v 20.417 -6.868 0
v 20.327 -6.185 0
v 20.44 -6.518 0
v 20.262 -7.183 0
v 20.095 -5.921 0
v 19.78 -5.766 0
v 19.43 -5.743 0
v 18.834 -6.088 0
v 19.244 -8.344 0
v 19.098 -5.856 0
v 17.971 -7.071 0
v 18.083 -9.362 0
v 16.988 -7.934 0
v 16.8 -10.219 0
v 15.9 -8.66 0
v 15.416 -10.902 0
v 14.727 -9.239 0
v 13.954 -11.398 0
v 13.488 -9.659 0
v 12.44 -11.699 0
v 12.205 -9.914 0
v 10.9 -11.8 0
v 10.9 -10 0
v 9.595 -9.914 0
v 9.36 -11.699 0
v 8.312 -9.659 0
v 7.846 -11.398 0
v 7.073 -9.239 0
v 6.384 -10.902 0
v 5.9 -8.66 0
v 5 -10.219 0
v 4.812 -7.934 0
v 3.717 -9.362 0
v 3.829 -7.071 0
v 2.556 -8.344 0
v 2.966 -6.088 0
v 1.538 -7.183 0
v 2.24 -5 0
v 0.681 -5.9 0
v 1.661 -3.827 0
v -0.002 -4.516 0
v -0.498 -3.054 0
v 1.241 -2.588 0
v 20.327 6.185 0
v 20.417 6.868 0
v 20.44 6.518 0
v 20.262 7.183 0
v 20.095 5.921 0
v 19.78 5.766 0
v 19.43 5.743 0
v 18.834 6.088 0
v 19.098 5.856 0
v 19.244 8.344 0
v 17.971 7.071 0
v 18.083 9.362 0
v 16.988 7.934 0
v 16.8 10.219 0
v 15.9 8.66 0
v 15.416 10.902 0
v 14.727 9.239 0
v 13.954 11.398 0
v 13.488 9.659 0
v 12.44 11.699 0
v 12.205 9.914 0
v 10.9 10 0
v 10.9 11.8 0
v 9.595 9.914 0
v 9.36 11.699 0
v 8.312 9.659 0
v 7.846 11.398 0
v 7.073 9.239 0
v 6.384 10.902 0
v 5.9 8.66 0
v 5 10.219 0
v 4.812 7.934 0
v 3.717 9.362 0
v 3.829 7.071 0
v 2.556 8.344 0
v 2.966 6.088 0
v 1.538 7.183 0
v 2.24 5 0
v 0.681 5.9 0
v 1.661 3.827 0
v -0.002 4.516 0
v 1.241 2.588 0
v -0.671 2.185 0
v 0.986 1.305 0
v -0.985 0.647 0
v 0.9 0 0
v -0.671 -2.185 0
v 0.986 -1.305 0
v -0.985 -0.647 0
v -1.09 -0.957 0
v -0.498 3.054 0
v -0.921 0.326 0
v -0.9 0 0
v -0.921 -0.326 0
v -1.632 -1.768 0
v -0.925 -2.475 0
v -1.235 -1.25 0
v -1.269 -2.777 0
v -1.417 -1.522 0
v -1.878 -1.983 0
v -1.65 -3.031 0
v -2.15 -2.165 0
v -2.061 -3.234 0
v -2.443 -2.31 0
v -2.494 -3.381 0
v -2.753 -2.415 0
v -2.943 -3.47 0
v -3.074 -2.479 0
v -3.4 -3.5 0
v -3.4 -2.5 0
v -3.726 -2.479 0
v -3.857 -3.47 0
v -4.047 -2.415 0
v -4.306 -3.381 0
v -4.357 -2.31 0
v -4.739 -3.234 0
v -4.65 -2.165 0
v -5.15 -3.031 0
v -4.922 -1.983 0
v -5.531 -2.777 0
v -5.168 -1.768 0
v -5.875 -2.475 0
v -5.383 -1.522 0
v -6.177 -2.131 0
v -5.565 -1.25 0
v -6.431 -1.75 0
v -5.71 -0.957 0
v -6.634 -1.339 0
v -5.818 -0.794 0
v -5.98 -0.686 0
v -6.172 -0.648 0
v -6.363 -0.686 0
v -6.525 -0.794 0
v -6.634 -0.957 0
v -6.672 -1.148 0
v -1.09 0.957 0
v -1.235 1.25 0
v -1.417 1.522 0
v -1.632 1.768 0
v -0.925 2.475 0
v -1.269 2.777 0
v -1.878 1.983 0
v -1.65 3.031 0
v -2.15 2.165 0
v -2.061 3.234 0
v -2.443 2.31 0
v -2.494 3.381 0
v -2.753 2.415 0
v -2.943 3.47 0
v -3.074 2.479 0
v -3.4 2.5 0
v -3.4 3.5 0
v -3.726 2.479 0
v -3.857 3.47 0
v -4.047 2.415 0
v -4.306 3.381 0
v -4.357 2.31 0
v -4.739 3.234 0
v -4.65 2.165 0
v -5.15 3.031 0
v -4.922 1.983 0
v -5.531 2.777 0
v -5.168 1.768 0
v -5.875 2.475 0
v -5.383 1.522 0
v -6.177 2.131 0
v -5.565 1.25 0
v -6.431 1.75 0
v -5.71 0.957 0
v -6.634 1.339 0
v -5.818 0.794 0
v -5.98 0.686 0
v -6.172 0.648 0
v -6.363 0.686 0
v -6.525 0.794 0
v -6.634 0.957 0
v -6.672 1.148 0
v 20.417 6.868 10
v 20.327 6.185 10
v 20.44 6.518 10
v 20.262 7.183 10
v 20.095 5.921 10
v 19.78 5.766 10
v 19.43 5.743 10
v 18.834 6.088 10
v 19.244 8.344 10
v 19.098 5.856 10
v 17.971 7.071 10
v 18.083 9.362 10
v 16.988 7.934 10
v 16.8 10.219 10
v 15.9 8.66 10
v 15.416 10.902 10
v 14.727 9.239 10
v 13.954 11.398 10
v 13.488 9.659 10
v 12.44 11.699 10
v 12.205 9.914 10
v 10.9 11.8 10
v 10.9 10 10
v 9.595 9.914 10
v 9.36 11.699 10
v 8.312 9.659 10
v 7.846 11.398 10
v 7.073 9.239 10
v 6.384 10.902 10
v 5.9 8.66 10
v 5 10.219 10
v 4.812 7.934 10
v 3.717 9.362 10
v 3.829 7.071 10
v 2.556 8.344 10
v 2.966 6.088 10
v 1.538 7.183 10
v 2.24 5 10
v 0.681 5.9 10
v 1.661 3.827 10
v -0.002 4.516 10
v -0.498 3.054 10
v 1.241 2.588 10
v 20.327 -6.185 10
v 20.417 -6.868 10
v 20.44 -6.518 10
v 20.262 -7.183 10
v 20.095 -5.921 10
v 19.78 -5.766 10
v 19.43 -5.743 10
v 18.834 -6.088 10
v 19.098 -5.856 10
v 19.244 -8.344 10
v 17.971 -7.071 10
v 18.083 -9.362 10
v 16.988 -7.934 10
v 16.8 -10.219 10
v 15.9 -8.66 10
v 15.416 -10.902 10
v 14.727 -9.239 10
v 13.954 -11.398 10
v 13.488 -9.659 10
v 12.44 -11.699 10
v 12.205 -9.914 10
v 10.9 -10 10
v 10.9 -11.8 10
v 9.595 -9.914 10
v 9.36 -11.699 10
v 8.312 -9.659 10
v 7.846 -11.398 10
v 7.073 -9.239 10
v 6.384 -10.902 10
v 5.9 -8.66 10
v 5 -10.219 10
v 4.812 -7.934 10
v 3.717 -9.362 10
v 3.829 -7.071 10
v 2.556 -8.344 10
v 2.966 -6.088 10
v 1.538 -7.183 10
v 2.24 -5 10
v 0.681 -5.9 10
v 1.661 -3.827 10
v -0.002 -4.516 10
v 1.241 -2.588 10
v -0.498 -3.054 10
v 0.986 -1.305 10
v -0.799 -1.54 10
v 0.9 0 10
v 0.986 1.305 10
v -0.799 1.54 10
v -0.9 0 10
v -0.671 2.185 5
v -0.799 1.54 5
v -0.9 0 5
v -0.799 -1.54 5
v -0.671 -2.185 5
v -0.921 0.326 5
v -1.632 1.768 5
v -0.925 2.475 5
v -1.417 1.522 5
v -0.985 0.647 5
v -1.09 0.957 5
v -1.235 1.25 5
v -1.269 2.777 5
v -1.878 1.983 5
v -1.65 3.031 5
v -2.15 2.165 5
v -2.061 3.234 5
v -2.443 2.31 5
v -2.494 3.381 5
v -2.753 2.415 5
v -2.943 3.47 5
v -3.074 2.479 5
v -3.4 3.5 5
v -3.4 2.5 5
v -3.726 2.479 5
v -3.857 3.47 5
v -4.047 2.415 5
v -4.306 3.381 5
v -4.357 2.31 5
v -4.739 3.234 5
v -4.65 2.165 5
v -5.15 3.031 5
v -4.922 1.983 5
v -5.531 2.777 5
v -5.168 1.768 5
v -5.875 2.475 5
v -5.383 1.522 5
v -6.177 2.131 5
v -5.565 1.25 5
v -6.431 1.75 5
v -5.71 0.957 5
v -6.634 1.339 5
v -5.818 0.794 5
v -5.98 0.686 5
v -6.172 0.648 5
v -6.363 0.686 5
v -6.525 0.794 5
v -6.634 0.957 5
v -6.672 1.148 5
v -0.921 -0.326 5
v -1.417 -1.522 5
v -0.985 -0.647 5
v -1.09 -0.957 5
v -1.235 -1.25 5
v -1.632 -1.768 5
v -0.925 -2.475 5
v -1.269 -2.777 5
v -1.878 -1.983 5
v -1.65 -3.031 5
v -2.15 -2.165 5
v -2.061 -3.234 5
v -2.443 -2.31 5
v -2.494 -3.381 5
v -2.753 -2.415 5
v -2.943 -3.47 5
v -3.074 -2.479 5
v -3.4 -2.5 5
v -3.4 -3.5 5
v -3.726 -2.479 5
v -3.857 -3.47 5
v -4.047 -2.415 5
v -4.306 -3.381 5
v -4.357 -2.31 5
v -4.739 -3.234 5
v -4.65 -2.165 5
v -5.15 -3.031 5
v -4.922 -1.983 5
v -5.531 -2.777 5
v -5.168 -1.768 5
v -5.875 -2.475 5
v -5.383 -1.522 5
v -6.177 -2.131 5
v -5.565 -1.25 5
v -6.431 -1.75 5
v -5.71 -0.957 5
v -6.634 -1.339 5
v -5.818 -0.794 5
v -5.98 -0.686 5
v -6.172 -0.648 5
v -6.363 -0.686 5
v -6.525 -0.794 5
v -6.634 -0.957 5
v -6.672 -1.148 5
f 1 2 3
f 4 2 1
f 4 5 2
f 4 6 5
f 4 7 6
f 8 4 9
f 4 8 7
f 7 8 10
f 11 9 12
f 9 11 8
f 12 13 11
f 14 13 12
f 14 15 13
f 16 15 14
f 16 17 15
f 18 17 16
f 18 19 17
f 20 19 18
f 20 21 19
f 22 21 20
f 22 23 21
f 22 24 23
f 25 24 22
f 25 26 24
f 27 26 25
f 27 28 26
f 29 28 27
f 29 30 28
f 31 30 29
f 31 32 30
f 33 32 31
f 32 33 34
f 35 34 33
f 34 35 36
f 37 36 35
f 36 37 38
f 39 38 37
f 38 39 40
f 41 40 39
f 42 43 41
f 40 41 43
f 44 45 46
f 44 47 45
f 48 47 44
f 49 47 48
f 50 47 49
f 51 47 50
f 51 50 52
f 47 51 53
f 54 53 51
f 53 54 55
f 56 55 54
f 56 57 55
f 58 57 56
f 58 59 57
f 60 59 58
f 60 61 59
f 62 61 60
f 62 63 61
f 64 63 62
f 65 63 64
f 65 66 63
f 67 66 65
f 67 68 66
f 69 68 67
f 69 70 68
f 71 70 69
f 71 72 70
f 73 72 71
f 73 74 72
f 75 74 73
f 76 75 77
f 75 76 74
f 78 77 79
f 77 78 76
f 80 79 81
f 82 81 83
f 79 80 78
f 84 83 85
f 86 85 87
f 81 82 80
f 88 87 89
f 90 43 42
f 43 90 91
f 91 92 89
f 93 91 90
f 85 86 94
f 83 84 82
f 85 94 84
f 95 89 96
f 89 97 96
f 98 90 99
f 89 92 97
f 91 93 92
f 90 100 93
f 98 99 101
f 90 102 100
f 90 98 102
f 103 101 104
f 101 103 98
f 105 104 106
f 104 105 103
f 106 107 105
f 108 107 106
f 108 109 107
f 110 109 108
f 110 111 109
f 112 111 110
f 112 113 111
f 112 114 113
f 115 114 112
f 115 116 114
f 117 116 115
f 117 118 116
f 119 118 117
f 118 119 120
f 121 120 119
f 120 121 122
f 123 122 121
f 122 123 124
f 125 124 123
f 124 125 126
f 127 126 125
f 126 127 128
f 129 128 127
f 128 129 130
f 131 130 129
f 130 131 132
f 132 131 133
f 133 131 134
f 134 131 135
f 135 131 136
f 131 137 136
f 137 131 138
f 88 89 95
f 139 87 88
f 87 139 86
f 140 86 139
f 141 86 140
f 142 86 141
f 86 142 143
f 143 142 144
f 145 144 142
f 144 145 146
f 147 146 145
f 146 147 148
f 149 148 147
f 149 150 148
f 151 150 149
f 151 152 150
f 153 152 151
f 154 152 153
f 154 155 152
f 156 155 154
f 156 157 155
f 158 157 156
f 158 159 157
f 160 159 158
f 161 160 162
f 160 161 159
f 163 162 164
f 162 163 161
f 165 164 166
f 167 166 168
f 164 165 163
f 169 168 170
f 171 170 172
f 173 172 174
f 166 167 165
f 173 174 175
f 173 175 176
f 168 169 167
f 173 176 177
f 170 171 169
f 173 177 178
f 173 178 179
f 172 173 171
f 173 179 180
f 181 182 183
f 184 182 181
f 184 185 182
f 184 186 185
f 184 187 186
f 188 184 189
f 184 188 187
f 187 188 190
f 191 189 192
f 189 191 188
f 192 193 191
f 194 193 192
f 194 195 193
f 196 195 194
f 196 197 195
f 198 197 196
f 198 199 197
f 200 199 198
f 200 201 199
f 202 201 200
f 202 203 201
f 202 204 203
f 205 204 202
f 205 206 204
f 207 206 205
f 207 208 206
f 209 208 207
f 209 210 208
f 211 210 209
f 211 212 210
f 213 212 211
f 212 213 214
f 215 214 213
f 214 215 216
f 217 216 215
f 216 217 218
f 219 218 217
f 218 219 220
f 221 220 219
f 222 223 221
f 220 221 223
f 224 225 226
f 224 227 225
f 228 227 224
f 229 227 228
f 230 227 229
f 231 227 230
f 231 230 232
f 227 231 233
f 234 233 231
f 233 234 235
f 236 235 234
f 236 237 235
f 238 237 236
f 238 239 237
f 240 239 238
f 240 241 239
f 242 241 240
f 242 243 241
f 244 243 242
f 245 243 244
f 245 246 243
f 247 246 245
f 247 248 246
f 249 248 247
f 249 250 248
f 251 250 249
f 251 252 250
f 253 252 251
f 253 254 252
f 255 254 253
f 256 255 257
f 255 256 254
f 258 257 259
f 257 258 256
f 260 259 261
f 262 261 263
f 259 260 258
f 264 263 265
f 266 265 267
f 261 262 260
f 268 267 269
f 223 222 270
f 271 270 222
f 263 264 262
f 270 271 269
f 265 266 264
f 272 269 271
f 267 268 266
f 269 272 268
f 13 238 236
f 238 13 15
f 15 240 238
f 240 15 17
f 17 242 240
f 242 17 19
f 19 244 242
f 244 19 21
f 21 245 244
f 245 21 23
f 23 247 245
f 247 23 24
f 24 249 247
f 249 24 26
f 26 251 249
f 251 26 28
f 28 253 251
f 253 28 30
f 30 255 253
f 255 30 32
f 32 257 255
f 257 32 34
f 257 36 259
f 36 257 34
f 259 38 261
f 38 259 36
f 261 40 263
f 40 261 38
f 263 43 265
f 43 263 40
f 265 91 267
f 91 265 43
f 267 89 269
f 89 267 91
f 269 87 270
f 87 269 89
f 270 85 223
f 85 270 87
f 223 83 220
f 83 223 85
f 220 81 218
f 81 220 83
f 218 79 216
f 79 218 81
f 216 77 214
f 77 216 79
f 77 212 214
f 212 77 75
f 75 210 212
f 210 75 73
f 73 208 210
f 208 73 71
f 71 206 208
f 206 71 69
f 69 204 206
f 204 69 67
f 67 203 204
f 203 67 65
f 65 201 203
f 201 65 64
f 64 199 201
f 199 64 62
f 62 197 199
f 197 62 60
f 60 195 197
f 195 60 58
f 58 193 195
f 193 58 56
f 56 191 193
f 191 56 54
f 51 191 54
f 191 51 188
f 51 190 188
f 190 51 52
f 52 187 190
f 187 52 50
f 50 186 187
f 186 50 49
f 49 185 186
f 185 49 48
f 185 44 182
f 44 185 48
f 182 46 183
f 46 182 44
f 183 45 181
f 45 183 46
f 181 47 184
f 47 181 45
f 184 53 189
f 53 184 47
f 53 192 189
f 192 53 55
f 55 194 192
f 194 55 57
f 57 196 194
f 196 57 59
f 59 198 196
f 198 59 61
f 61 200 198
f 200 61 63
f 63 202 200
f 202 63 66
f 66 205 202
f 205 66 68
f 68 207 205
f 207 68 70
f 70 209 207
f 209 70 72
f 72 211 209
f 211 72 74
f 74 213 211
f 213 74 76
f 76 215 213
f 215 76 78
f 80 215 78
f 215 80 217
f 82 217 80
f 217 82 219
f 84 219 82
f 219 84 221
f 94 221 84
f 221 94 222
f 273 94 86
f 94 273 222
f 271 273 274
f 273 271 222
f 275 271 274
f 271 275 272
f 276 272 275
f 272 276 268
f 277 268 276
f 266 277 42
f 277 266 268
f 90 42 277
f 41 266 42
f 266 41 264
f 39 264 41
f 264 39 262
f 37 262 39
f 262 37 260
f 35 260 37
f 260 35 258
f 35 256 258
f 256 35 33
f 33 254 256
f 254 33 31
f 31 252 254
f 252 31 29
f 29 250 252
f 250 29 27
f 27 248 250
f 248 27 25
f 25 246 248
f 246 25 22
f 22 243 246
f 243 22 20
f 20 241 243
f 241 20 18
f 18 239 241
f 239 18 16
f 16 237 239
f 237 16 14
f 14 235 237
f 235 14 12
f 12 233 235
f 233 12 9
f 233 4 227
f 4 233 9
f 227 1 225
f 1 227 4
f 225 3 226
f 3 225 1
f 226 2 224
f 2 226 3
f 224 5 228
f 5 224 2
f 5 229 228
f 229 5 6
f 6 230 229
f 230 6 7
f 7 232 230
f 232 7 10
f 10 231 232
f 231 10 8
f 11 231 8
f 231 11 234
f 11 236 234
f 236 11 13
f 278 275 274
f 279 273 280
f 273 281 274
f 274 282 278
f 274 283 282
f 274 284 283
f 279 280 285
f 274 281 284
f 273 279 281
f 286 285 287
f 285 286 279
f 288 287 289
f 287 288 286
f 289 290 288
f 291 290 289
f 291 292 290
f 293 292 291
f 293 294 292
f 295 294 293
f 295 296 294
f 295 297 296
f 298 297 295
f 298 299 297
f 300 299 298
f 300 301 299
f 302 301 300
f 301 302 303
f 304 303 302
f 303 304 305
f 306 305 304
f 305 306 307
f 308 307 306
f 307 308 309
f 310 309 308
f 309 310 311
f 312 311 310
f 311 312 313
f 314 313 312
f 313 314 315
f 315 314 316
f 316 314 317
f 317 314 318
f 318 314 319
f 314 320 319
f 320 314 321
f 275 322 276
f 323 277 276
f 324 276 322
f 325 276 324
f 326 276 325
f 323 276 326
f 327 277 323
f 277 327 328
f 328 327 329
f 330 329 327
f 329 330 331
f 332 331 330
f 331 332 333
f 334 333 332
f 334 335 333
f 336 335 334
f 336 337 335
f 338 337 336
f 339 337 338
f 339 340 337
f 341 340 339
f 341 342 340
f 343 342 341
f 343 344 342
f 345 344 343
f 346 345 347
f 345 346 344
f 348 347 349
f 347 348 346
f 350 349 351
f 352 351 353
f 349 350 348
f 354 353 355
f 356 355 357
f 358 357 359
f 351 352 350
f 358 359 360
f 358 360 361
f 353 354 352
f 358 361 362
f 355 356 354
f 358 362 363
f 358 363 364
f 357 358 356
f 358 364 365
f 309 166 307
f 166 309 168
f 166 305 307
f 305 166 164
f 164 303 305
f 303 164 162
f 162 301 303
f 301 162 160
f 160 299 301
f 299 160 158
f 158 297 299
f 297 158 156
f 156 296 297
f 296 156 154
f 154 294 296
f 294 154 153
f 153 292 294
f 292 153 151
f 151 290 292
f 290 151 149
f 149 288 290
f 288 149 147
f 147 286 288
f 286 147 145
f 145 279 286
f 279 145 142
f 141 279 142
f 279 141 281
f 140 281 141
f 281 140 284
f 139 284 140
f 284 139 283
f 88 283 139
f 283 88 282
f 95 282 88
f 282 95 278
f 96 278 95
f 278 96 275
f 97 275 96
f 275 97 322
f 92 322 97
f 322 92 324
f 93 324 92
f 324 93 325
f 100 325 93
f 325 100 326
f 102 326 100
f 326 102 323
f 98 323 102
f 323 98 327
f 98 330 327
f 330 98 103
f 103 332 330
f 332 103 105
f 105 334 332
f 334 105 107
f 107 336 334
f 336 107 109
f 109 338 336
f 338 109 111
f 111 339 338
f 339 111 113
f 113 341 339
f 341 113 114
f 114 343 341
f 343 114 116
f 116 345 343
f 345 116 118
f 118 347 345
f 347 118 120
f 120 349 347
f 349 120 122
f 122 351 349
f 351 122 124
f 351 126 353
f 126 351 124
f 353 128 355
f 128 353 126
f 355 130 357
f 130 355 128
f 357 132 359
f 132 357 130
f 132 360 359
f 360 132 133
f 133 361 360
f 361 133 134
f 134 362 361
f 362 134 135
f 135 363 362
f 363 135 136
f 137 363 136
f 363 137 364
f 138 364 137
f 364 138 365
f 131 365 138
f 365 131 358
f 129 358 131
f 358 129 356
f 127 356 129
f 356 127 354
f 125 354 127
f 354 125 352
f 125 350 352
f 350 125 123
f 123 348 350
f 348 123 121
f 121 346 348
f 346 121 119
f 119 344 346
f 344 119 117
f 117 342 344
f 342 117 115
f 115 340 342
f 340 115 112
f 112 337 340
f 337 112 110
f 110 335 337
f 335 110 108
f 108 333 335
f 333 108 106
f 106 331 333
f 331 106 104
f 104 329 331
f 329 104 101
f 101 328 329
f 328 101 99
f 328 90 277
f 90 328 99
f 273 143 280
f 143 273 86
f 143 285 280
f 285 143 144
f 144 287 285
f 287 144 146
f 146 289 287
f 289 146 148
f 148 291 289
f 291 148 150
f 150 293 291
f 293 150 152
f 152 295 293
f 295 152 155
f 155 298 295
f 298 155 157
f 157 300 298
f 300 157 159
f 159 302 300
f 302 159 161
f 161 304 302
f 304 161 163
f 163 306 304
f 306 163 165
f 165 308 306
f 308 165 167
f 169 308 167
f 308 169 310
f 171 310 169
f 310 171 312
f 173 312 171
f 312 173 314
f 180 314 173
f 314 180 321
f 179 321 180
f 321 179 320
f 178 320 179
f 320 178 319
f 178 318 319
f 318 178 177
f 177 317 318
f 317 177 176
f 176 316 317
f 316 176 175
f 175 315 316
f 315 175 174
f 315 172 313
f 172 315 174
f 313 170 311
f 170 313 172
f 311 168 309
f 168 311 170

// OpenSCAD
module c_ring(h=10, id=20, th=1.8, opening=90, nozzle_d=0.4) {
    od = id + 2*th;

    r = od/2 + th;
    wedge_points = [
        [0, 0],
        [r*cos(opening/2), r*sin(opening/2)],
        [r, 0],
        [r*cos(-opening/2), r*sin(-opening/2)]
    ];

    linear_extrude(h, convexity=4) {
        difference() {
            circle(d=od, $fn=48);
            circle(d=id, $fn=48);
            polygon(wedge_points);
        }
        
        for (theta = [-opening/2:opening:opening]) {
            rotate([0, 0, theta])
                translate([(id/2+od/2)/2, 0, 0])
                    circle(d=th, $fn=16);
        }
    }
}

// This part should snap onto the pipes of the Manfrotto Magic Arm.
translate([(20+1.8)/2, 0, 0])
    c_ring(h=10, id=20, th=1.8, opening=75);

rotate([0, 0, 180]) translate([(5+1.8)/2, 0, 0])
    c_ring(h=5, id=5, th=1, opening=45);
